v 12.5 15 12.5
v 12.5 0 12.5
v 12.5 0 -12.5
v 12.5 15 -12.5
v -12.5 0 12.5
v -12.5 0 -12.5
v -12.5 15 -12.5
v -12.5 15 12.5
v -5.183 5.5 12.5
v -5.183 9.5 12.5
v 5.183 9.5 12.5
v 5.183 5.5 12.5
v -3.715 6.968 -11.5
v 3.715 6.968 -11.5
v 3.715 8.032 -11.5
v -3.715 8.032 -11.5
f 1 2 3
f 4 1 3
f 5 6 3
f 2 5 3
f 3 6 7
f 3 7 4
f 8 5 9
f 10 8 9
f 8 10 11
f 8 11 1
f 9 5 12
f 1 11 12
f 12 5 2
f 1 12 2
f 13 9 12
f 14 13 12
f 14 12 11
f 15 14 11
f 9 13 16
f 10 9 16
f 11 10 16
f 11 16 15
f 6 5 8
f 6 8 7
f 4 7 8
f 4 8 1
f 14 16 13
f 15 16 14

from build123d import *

# Parameters (mm, degrees)
SKETCH1_W           = 25
SKETCH1_H           = 25
BOSS_EXTRUDE1_DEPTH = 15
SKETCH2_W           = 10.366354442
SKETCH2_H           = 4
CUT_EXTRUDE1_DEPTH  = 24
CUT_EXTRUDE1_DRAFT  = -3.5


with BuildPart() as part:
    # Sketch1 → Boss-Extrude1 (new body)
    with BuildSketch(Plane(origin=(0, 0, 0), x_dir=(1, 0, 0), z_dir=(0, 1, 0))):
        Rectangle(SKETCH1_W, SKETCH1_H)
    extrude(amount=BOSS_EXTRUDE1_DEPTH)


with BuildPart() as cut_extrude1_tool:
    # Sketch2 → Cut-Extrude1 (with draft: the straight prism first)
    with BuildSketch(Plane.XY.offset(12.5)):
        with Locations((0, 7.5)):
            Rectangle(SKETCH2_W, SKETCH2_H)
    extrude(amount=-CUT_EXTRUDE1_DEPTH)
    # Cut-Extrude1: the draft: its side faces are tilted about the plane it starts from
    cut_extrude1_sides = [cut_extrude1_tool.faces().sort_by_distance(p)[0] for p in [
        (-5.183177221, 7.5, 0.5),
        (0, 5.5, 0.5),
        (5.183177221, 7.5, 0.5),
        (0, 9.5, 0.5),
    ]]
    draft(cut_extrude1_sides, Plane.XY.offset(12.5), CUT_EXTRUDE1_DRAFT)


with BuildPart() as part_1:
    add(part.part)

    # Cut-Extrude1: cut by cut_extrude1_tool
    add(cut_extrude1_tool.part, mode=Mode.SUBTRACT)


solid = part_1.part
